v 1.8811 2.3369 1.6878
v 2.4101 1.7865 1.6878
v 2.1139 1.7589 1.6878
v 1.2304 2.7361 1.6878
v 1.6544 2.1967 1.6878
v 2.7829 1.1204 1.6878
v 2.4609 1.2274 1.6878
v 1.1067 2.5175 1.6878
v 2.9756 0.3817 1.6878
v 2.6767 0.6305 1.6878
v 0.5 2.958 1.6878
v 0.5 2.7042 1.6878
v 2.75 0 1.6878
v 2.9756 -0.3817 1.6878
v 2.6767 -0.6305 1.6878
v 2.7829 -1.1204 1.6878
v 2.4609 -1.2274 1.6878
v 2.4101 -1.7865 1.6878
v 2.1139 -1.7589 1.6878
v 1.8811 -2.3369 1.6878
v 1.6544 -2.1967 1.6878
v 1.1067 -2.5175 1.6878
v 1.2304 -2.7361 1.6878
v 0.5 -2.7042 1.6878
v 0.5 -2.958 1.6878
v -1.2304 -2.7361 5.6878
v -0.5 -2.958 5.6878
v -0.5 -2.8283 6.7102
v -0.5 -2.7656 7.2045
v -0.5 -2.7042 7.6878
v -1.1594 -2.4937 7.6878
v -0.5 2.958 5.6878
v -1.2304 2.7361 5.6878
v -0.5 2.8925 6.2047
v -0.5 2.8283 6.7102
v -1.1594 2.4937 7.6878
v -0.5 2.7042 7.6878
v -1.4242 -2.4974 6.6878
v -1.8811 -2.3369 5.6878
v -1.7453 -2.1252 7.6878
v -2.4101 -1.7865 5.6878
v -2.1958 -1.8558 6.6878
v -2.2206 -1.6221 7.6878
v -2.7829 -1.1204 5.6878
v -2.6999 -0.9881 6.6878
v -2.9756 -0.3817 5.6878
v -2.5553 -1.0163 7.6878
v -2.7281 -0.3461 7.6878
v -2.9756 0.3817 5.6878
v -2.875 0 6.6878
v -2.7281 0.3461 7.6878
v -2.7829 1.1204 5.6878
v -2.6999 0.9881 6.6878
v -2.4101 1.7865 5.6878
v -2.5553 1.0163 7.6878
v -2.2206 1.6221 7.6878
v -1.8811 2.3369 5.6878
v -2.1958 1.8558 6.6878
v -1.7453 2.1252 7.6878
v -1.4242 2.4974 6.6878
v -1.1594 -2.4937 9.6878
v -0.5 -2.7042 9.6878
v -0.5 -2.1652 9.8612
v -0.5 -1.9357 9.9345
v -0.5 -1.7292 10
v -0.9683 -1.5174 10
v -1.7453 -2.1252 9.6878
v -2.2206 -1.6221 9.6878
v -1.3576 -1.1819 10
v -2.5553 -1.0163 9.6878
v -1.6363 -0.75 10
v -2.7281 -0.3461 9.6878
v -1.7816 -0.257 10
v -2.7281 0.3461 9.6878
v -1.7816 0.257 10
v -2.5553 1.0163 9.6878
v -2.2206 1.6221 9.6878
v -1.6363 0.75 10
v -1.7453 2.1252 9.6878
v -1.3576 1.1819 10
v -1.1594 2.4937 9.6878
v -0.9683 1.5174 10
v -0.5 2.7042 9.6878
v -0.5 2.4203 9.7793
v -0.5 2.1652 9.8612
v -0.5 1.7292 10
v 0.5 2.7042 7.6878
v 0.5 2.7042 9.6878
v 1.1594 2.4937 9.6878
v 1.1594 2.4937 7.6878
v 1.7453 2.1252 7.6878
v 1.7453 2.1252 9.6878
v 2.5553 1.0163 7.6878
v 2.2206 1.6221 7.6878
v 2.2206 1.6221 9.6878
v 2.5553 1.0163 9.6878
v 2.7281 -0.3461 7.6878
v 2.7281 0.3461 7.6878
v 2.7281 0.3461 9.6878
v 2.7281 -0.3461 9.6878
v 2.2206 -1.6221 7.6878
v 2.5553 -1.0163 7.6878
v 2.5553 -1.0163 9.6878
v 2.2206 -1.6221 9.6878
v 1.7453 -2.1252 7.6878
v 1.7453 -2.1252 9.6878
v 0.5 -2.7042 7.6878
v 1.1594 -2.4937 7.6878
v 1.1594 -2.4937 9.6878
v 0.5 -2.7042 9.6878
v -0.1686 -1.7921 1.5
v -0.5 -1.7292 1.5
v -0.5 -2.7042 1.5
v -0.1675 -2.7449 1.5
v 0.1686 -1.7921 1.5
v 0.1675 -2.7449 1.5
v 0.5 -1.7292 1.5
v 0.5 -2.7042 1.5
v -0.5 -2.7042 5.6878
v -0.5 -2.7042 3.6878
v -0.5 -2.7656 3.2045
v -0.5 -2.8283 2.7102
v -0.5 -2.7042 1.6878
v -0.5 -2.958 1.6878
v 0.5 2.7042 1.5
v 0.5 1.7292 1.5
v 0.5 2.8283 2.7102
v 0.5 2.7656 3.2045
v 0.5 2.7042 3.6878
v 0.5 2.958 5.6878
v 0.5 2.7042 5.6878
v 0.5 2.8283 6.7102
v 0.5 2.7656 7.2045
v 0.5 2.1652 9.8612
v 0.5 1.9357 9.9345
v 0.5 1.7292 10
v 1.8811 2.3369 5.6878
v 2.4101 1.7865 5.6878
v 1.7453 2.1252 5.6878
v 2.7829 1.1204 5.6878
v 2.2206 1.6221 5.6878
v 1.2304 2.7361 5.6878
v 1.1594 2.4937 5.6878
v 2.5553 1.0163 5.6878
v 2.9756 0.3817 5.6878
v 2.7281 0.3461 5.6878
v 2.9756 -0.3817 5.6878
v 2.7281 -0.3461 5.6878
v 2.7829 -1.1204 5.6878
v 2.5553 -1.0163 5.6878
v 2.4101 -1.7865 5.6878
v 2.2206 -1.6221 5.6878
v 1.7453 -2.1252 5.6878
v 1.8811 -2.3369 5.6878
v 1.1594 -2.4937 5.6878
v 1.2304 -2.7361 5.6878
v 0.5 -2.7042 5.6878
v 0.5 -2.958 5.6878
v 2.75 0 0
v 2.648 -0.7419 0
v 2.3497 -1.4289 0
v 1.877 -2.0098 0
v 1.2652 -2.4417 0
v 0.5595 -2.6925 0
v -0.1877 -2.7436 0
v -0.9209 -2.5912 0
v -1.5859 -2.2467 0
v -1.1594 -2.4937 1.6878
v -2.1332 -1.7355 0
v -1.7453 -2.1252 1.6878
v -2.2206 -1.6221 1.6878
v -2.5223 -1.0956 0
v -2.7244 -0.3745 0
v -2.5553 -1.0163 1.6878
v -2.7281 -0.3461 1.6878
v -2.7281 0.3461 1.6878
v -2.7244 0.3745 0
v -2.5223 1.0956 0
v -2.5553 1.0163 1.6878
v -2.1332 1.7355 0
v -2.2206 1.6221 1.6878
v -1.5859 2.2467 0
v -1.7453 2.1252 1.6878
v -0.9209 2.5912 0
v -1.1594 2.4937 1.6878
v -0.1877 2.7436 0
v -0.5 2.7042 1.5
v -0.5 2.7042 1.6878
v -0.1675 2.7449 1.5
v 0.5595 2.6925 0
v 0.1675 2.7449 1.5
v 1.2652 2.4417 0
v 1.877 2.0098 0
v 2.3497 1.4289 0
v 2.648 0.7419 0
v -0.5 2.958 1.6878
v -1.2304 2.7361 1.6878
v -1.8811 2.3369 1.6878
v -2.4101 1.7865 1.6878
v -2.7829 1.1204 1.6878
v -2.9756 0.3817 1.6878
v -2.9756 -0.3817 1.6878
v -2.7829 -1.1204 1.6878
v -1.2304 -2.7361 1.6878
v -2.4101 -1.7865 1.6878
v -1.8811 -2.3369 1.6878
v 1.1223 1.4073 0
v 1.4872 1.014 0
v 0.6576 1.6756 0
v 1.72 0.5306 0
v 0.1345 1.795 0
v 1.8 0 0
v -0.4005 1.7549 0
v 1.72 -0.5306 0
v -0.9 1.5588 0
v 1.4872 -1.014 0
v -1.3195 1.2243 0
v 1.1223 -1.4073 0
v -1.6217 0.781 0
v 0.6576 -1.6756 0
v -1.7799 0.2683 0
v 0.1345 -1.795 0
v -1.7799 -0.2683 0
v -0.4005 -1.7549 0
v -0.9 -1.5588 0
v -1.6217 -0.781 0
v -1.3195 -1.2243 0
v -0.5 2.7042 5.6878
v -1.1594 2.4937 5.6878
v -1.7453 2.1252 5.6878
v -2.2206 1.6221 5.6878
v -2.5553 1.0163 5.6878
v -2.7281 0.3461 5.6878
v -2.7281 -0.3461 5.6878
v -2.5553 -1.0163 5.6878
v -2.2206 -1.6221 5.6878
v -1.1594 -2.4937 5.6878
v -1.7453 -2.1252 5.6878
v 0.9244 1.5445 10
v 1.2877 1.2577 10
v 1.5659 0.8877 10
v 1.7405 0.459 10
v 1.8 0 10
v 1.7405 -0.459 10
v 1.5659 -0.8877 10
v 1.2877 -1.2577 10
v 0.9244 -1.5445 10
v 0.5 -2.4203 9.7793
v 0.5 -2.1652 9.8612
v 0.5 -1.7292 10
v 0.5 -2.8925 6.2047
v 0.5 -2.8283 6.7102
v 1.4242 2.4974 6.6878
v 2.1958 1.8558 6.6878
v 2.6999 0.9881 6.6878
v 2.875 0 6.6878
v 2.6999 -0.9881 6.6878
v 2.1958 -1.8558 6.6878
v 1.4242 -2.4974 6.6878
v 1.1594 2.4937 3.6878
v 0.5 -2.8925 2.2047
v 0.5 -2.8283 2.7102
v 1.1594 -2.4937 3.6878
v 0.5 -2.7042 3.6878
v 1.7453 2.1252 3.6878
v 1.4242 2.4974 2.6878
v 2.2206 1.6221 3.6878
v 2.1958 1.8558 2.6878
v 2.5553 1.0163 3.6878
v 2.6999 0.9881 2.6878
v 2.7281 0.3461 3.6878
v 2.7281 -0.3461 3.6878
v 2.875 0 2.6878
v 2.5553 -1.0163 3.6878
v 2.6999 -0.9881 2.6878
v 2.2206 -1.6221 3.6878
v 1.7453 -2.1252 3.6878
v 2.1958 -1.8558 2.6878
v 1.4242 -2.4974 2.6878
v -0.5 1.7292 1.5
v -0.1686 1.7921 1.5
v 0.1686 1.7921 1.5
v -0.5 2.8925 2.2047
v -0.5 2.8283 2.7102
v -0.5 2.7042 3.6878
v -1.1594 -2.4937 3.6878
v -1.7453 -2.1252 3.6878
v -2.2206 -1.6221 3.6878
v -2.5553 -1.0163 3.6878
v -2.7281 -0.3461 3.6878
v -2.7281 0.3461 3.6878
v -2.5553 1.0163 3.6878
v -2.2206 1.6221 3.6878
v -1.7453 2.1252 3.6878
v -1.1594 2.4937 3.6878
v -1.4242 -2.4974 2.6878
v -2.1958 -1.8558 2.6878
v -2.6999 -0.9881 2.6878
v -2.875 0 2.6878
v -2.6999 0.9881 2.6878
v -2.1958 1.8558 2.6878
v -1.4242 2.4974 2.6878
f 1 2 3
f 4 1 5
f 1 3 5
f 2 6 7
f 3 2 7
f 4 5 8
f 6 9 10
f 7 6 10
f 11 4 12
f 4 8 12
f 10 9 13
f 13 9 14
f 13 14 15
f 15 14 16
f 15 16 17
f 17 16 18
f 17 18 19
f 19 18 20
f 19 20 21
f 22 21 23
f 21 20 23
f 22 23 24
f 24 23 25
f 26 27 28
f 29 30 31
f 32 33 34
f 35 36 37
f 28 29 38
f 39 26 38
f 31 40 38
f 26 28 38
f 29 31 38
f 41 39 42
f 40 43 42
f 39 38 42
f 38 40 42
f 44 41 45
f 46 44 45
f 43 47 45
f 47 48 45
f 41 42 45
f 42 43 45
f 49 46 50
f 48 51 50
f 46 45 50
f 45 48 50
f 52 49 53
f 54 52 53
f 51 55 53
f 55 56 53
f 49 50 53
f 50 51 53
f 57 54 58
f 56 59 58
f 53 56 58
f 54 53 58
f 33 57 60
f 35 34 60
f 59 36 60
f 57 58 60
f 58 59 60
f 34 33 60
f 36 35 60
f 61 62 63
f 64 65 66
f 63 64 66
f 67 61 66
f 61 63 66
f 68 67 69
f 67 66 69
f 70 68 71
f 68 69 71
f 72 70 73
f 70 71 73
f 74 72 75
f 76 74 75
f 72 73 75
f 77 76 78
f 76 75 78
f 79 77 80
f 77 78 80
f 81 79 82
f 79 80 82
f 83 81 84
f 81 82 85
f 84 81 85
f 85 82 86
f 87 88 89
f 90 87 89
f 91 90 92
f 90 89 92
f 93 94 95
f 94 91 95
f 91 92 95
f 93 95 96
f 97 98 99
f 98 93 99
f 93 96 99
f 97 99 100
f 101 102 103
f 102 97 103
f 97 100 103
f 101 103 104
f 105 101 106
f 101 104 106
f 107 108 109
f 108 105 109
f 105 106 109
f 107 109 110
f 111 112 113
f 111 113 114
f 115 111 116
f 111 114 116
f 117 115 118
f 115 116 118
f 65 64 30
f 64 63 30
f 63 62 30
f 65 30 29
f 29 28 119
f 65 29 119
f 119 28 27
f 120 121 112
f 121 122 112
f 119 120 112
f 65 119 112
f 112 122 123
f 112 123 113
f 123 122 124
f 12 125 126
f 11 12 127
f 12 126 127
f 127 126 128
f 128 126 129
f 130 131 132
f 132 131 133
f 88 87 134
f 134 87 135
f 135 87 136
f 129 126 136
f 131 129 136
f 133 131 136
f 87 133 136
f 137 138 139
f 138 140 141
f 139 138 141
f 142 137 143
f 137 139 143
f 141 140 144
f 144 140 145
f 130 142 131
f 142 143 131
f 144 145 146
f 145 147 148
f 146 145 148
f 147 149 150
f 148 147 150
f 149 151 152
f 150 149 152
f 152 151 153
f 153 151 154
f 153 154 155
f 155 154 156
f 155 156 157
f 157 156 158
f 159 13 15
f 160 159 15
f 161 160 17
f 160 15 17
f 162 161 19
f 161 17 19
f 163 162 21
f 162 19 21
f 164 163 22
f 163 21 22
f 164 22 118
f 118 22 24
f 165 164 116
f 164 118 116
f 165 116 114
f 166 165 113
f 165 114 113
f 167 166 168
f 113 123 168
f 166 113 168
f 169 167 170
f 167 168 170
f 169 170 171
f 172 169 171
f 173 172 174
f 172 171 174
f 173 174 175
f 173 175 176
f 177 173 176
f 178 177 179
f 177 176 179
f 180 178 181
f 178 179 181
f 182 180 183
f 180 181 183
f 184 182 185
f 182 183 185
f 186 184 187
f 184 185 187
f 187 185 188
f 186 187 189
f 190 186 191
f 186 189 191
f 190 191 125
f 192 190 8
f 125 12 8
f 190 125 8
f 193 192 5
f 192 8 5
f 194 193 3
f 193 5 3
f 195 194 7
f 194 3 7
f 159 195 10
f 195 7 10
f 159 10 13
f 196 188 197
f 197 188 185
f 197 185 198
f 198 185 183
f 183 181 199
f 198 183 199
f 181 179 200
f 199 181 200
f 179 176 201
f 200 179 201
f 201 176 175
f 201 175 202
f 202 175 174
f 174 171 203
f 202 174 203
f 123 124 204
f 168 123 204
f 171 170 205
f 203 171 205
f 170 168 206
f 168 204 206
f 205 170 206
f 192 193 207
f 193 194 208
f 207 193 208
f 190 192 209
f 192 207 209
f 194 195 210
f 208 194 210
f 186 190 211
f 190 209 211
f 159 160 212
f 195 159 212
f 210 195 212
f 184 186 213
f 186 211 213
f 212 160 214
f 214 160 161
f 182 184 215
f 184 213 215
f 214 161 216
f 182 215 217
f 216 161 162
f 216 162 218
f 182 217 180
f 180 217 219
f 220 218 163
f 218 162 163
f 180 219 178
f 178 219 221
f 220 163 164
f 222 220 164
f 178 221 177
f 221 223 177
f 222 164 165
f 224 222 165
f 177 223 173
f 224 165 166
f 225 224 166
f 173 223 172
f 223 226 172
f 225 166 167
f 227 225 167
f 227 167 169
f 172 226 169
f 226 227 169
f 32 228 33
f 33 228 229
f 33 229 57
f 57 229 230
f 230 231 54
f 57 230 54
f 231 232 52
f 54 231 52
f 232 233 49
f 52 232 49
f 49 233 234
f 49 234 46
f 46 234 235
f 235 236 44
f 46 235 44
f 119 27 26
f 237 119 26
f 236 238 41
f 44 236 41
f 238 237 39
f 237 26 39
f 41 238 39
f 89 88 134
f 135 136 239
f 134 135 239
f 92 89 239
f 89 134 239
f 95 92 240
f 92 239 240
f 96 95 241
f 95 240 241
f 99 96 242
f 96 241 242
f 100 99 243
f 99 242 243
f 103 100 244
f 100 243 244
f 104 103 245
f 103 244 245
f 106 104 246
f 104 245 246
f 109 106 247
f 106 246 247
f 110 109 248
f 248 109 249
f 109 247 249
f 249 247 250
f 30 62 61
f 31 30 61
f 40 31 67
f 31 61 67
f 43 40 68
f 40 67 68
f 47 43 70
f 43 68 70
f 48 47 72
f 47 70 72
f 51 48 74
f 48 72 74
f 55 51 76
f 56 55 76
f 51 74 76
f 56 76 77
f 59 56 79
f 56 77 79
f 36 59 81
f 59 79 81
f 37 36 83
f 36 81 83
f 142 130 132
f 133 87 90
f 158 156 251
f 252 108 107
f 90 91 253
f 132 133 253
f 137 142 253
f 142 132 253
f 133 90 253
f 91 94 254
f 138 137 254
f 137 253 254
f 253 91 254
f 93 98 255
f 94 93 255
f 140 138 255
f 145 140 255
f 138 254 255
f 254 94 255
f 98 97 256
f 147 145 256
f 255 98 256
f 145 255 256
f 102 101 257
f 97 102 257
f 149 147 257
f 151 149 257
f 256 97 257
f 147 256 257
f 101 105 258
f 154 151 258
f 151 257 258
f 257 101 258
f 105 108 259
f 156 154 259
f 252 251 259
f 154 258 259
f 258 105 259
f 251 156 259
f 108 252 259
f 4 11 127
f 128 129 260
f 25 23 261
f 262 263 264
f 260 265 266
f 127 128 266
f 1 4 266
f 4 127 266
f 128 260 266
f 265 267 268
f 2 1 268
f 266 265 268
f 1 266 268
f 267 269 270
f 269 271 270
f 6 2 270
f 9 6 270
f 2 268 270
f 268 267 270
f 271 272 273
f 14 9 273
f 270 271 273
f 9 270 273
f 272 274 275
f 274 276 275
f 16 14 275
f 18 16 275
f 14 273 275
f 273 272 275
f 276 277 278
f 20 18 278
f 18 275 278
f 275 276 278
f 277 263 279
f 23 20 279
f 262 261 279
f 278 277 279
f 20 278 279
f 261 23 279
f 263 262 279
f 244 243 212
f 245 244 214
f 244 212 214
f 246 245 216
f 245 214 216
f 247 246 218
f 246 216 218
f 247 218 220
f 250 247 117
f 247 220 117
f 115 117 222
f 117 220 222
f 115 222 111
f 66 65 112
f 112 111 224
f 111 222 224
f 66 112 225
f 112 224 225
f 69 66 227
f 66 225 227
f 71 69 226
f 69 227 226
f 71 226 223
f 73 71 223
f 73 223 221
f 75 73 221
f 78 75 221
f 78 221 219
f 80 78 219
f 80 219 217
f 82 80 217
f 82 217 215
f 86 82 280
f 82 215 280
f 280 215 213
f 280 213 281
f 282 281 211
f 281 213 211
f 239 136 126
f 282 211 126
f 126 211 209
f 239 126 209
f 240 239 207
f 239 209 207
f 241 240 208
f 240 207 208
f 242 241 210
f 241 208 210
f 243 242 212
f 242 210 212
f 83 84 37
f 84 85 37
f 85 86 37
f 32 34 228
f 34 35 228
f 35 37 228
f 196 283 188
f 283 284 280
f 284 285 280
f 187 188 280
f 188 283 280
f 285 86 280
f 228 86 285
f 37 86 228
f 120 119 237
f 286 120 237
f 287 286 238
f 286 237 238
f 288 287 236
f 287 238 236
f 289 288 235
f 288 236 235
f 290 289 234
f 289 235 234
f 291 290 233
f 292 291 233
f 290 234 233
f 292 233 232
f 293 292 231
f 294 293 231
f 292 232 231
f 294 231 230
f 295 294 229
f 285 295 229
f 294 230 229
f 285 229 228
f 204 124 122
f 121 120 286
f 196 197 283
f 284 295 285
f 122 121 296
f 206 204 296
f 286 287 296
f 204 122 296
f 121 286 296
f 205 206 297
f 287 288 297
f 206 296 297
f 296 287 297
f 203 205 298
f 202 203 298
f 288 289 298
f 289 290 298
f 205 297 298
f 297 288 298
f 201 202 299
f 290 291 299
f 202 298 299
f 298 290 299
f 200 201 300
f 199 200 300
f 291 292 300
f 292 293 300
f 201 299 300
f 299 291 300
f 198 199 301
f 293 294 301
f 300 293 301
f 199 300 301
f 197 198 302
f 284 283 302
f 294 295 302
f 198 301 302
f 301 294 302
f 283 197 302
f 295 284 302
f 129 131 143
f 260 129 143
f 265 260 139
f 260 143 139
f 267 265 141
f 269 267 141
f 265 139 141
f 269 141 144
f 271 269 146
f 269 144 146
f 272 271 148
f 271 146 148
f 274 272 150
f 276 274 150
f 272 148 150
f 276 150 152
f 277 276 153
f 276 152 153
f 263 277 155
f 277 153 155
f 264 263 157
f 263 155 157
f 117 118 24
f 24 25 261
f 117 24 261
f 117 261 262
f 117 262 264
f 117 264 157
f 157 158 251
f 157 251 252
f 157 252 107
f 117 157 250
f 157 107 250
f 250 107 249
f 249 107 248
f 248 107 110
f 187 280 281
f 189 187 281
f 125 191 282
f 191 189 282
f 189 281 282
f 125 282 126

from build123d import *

# Parameters (mm, degrees)
F3_DEPTH = 12.5


with BuildPart() as f1:
    # F0 (on Front) → F1 (revolve)
    with BuildSketch(Plane.XZ):
        Polygon((2.75, 9.6877501001), (1.8, 10), (1.8, 0), (2.75, 0), (2.75, 1.6877501001), (3, 1.6877501001), (2.75, 3.6877501001), (2.75, 5.6877501001), (3, 5.6877501001), (2.75, 7.6877501001), align=None)
    revolve(axis=Axis((0, 0, 0.3669395117), (0, 0, -1)))

    # F2 (on Front) → F3 (cut, symmetric)
    with BuildSketch(Plane.XZ):
        Polygon((0.5, 10), (-0.5, 10), (-0.5, 1.5), (0, 1.5), (0.5, 1.5), align=None)
    extrude(amount=F3_DEPTH, both=True, mode=Mode.SUBTRACT)


solid = f1.part
